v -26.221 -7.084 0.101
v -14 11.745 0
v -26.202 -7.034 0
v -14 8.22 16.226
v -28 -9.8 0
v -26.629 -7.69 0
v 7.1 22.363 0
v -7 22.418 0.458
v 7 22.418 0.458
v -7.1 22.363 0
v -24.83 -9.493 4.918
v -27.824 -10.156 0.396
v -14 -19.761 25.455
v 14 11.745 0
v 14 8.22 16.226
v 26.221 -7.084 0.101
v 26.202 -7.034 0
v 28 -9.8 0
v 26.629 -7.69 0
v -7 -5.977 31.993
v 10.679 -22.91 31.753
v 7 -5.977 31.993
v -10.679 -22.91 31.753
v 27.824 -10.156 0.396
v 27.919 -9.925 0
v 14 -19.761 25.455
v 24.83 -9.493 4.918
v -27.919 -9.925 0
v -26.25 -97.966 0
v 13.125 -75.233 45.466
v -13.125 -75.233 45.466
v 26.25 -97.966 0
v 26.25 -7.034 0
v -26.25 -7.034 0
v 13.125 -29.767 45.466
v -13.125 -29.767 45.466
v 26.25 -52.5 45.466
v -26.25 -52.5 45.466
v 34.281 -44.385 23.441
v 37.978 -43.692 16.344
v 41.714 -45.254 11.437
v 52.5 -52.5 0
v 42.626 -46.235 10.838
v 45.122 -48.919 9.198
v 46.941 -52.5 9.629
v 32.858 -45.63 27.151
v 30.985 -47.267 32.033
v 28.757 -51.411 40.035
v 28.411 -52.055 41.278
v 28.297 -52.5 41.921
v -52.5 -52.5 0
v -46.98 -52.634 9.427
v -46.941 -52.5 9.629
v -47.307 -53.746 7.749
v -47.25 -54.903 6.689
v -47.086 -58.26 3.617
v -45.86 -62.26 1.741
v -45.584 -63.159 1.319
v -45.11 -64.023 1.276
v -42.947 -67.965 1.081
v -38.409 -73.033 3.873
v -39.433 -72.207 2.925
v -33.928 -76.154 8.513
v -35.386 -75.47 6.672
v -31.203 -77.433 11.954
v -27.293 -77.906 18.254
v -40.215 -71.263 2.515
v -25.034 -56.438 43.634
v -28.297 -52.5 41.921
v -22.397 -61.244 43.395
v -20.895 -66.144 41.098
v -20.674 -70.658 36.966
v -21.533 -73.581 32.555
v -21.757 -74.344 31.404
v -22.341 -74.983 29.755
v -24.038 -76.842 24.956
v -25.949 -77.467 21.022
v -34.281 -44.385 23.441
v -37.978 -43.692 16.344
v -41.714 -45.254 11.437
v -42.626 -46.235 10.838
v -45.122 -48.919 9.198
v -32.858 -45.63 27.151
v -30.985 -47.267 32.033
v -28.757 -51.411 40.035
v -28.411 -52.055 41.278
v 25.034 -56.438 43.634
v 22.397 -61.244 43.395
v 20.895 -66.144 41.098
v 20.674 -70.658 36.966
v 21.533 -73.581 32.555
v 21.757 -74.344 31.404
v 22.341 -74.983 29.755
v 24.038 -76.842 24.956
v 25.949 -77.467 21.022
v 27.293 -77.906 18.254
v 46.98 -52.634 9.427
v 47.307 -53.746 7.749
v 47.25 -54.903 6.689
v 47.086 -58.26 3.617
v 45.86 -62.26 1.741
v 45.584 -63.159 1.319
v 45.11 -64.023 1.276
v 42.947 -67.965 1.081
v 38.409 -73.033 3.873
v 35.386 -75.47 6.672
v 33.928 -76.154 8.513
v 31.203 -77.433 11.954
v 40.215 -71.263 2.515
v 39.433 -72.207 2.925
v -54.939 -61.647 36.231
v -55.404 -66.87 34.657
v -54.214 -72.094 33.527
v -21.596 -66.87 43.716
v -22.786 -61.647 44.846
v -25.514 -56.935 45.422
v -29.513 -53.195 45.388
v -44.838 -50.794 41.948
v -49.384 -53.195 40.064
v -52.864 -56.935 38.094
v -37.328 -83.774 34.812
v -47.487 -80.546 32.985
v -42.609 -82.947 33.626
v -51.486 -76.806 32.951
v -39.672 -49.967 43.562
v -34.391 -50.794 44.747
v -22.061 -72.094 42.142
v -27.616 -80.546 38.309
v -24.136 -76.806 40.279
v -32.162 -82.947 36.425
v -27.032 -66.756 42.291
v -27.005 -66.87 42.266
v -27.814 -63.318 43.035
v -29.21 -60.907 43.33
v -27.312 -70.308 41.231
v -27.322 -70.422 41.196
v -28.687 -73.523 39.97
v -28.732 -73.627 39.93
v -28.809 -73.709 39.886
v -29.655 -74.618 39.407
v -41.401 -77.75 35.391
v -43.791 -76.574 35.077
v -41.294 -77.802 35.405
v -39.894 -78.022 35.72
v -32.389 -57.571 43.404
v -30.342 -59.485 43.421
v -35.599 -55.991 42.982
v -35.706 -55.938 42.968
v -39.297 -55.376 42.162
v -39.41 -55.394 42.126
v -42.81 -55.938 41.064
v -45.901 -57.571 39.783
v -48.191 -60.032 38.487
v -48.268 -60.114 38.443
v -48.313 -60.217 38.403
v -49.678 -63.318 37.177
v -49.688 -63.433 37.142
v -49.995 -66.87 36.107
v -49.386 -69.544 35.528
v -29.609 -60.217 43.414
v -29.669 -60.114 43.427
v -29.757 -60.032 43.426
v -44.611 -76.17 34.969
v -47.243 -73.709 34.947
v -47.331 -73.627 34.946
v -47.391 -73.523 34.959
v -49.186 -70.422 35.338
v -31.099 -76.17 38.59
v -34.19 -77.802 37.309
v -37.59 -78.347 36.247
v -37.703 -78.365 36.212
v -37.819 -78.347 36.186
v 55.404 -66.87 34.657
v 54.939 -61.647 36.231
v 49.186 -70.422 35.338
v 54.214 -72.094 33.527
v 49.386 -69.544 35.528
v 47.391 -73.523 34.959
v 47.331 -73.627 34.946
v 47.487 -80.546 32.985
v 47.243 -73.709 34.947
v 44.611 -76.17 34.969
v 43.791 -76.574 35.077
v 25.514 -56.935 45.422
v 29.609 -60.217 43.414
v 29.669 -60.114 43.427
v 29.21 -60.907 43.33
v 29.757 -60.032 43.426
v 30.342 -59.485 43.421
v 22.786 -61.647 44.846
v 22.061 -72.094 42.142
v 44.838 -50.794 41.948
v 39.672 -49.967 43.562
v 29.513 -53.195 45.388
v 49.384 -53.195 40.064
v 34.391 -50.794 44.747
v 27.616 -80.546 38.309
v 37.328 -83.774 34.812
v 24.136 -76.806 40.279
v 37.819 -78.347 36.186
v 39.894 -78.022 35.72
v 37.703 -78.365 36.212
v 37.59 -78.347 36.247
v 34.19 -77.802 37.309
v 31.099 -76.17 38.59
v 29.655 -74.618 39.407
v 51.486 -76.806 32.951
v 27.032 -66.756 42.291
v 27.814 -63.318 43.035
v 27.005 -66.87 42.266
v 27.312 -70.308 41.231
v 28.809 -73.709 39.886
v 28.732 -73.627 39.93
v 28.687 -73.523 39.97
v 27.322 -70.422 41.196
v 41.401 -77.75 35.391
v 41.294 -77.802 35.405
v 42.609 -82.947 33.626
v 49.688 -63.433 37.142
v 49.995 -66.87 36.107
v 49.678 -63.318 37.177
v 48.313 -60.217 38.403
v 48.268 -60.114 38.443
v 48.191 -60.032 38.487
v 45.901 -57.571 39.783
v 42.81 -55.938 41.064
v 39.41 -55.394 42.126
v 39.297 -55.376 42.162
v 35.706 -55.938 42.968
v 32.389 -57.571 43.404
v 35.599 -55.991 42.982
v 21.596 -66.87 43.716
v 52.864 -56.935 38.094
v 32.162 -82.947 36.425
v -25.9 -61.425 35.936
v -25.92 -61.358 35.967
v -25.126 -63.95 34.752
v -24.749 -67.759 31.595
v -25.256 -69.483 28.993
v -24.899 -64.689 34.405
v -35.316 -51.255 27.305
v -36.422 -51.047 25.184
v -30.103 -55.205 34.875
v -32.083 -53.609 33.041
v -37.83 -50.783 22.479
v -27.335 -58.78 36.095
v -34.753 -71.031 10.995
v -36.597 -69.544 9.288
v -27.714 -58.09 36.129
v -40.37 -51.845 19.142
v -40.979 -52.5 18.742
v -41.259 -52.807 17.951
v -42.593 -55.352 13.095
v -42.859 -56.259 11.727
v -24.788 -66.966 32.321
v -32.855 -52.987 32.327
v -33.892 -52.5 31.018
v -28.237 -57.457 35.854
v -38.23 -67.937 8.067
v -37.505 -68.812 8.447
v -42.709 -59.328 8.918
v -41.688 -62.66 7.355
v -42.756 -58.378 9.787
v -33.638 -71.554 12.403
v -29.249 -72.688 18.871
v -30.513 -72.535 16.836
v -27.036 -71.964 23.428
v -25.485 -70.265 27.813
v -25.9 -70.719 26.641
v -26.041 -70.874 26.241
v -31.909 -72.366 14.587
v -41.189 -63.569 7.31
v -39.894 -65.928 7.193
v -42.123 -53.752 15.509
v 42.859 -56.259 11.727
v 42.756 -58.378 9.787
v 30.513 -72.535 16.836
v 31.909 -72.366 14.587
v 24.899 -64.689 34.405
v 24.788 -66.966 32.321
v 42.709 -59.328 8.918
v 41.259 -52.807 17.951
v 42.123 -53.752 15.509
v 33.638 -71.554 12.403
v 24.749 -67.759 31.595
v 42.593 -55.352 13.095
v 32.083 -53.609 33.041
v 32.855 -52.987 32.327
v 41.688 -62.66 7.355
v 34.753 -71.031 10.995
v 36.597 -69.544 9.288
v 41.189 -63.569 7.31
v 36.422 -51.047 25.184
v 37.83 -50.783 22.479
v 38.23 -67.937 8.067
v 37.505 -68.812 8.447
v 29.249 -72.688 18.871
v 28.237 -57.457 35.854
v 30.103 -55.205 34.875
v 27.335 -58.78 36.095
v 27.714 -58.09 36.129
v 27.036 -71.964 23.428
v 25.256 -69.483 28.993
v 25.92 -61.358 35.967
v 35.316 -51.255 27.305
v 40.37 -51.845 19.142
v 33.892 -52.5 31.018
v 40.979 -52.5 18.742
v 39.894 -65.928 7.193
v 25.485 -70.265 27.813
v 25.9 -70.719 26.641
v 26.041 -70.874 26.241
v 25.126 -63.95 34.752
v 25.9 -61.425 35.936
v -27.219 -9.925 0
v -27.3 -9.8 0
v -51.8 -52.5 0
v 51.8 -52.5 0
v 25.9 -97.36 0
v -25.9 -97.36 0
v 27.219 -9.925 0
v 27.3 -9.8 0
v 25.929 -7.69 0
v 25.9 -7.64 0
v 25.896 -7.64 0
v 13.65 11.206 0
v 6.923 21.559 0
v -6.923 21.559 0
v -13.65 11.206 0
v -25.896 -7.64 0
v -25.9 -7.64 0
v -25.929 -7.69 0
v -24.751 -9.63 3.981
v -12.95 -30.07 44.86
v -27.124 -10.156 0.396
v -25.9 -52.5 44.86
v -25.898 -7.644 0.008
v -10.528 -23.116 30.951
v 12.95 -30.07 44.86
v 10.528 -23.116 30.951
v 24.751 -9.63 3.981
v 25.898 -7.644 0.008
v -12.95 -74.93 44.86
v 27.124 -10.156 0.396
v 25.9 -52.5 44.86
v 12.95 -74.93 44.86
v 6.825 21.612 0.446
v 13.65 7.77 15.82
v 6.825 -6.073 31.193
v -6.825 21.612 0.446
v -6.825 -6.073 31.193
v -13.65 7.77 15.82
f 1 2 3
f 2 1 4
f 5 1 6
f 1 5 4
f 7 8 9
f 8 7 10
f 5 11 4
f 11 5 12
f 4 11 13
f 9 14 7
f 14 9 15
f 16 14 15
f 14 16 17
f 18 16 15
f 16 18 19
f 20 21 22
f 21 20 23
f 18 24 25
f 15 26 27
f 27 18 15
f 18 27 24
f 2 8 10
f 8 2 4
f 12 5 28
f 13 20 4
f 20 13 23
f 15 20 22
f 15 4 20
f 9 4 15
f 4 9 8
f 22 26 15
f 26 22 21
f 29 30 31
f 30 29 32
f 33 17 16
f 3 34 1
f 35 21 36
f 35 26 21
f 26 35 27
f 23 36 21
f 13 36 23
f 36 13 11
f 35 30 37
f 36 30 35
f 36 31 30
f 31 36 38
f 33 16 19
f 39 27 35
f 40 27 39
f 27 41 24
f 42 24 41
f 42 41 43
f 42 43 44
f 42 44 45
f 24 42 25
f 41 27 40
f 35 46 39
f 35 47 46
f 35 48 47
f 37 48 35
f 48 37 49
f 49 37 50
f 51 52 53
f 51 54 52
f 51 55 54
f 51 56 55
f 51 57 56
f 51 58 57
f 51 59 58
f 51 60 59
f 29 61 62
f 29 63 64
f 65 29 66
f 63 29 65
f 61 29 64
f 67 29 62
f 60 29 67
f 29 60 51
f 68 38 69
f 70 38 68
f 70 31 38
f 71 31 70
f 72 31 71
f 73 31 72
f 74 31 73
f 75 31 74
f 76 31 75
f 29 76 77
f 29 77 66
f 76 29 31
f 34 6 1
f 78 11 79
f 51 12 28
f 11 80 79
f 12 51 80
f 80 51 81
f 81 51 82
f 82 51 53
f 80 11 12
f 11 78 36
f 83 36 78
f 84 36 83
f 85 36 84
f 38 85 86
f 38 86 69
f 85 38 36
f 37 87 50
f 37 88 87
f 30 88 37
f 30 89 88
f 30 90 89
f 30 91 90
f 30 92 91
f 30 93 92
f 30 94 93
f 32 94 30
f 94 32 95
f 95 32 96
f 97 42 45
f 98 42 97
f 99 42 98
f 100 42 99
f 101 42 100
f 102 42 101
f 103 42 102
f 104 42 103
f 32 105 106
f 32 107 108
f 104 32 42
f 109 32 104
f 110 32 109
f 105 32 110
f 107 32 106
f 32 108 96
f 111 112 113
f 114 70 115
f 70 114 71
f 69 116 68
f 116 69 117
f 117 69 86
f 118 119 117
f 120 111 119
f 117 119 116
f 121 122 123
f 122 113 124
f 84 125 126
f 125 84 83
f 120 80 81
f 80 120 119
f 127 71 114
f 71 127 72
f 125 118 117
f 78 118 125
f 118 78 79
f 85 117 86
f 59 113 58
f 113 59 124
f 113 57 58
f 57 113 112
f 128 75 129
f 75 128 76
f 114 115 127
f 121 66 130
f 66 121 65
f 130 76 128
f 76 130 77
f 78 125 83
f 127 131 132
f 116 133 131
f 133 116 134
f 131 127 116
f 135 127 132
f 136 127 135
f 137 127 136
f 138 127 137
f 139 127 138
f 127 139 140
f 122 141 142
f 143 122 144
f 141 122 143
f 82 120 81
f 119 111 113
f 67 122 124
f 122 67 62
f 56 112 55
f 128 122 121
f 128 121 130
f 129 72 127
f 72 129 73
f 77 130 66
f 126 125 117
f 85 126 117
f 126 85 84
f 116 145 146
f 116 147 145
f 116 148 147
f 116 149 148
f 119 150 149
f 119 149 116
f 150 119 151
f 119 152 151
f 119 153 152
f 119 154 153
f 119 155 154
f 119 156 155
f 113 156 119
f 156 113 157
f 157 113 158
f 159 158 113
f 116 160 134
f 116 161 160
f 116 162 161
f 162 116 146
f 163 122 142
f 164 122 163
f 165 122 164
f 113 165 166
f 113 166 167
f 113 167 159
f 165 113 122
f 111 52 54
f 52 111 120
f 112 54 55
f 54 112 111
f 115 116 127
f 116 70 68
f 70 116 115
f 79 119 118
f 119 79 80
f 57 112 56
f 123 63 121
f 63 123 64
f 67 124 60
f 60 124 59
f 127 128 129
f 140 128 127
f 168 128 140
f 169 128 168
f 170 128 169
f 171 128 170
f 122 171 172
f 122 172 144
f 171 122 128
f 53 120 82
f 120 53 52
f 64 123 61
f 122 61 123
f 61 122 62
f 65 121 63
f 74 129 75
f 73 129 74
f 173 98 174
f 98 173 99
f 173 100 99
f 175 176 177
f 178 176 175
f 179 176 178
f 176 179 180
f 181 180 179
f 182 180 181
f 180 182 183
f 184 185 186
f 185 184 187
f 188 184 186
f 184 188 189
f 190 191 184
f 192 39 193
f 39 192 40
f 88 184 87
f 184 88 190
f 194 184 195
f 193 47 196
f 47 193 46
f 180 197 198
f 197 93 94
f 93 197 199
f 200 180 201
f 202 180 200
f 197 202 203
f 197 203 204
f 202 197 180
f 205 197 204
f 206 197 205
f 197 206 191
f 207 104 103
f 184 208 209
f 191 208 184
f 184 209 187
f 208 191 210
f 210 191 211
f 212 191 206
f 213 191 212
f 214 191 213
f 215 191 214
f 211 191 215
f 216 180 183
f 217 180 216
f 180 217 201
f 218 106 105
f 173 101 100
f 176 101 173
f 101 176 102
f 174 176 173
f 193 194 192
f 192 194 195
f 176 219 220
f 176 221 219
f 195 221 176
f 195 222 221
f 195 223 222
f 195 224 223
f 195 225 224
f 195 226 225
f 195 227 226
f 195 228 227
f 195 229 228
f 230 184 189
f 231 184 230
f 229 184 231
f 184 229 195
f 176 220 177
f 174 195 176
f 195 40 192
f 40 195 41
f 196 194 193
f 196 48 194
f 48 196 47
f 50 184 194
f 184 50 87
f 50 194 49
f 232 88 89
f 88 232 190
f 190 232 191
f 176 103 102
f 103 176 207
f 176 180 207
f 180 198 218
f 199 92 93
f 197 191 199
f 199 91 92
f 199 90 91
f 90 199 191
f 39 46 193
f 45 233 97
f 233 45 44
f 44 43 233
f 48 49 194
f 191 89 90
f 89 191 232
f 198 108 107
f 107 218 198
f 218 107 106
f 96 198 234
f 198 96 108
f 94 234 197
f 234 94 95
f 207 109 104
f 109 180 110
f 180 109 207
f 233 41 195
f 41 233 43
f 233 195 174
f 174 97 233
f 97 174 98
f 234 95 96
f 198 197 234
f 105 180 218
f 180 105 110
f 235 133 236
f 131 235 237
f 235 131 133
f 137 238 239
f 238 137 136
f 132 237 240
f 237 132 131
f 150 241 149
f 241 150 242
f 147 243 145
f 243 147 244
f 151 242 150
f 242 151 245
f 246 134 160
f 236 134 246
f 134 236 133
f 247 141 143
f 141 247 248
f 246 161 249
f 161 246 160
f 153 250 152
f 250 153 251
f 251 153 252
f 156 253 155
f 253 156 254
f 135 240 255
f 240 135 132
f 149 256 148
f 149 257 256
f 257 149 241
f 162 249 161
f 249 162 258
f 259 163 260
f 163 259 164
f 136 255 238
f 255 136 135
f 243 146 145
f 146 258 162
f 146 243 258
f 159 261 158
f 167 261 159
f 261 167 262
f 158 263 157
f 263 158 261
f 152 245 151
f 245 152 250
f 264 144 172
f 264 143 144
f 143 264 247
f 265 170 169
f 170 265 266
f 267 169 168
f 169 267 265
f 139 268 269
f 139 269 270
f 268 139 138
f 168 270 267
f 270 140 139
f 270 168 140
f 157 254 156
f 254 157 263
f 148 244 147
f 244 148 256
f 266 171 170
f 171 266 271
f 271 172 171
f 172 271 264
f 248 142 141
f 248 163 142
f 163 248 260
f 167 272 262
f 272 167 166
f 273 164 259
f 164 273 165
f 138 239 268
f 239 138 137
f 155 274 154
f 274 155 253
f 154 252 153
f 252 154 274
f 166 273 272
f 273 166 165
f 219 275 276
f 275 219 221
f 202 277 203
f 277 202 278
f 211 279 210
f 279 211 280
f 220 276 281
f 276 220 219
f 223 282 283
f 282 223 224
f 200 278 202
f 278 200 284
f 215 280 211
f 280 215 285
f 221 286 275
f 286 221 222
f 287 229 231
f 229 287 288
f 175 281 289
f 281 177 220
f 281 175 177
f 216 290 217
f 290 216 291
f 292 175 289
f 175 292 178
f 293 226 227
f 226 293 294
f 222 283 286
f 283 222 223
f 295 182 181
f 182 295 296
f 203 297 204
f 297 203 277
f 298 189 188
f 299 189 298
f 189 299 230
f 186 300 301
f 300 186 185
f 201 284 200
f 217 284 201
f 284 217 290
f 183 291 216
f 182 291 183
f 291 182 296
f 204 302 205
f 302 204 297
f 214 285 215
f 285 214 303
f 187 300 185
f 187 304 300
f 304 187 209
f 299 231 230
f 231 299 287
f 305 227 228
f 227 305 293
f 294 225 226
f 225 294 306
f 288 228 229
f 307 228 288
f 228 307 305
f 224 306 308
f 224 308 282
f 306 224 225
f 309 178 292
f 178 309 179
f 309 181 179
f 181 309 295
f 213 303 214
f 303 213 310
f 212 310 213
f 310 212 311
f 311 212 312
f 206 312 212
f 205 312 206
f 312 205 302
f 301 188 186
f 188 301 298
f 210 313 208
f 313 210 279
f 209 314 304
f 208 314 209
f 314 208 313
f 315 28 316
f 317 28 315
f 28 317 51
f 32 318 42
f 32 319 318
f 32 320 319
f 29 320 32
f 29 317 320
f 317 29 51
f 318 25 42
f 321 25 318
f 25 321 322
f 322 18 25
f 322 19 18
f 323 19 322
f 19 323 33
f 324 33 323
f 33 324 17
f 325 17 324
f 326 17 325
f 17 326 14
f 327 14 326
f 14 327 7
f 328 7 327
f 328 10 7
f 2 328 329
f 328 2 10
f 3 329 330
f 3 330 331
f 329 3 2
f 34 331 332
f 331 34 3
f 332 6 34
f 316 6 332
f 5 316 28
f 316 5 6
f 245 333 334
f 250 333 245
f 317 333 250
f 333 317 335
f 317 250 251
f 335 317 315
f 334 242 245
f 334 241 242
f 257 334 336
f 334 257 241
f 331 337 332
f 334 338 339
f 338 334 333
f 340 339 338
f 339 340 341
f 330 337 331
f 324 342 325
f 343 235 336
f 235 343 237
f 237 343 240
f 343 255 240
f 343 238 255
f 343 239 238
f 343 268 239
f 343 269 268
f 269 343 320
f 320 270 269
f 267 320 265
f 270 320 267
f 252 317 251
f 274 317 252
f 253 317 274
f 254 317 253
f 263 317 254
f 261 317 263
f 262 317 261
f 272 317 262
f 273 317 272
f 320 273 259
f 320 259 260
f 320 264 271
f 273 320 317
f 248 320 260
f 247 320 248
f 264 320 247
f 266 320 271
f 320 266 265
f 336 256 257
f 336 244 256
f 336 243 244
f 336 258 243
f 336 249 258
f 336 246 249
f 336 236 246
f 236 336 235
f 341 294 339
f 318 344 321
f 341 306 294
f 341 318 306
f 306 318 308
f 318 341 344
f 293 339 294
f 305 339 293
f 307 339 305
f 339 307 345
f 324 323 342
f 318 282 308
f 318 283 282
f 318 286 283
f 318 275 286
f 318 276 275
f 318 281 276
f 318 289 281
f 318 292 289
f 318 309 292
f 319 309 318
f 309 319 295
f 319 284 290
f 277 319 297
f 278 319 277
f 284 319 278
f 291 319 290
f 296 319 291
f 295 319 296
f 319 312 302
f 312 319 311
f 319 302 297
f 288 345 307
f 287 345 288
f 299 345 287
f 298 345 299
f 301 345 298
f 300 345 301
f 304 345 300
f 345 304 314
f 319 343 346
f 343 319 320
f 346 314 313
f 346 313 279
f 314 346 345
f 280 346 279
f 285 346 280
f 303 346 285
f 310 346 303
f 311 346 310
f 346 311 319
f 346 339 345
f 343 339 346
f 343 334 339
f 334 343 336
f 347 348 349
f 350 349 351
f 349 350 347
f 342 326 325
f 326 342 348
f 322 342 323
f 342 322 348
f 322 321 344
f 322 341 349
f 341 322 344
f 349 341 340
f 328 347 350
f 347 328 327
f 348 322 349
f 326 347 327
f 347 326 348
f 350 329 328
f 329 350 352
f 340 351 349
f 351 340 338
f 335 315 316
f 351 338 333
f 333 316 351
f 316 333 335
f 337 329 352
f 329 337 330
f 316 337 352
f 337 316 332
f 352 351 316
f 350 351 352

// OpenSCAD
difference() {
    union() {
        mask();
        translate([0,0,-10]) linear_extrude(10) projection(cut=true) translate([0,0,-.000001]) mask();
    }
    translate([0,25,-12]) scale([.85,1,1]) sphere(d=21);
}



module mask() {
    scale (1.4)
    difference() {
        $fn=6;
        union() {
            main_mask();
            tubes();
        }
        all_cutouts();
    }
}

module tubes() {
    difference() {
        union() {
            translate([-20,-40,0]) rotate([15,-15,0]) cylinder($fn=20, d=25, h=30);
            translate([20,-40,0]) rotate([15,15,0]) cylinder($fn=20, d=25, h=30);
        }
    }
}

module tubes_cutout() {
    translate([-20,-40,0]) rotate([15,-15,0]) cylinder($fn=20, d=25-8, h=31);
    translate([20,-40,0]) rotate([15,15,0]) cylinder($fn=20, d=25-8, h=31);
}

module all_cutouts() {
    tubes_cutout();
    mask_cutout();
}

module main_mask() {
    difference () {
        union() {
            translate([0,-7,0]) rotate([-48,0,0]) scale([1,1.75,1])
                hollow_sphere(40, hollow=1, thickness=1.6);
            translate([0,-37.5,0])
                hollow_sphere(hollow=1, thickness=1.6);
        }
        //translate([0,-37,0]) cylinder(d=37,h=100);
    }
}

module mask_cutout() {    
    translate([-200/2,-200/2,-200]) cube(200);
    translate([0,-37.5,0])
        hollow_sphere(diam=74, hollow=0);
    
    translate([0,-7,0]) rotate([-48,0,0]) scale([1,1.75,1])
        hollow_sphere(39, hollow=0);
}
//scale([1.4,1.4,1.4]) 

module hollow_sphere(diam=75, thickness=1, half=0, hollow=0) {
    difference() {
        sphere(d=diam);
        if (hollow) sphere(d=diam-thickness);
        if (half) translate([-diam/2,-diam/2,-diam]) cube(diam);
    }
}
